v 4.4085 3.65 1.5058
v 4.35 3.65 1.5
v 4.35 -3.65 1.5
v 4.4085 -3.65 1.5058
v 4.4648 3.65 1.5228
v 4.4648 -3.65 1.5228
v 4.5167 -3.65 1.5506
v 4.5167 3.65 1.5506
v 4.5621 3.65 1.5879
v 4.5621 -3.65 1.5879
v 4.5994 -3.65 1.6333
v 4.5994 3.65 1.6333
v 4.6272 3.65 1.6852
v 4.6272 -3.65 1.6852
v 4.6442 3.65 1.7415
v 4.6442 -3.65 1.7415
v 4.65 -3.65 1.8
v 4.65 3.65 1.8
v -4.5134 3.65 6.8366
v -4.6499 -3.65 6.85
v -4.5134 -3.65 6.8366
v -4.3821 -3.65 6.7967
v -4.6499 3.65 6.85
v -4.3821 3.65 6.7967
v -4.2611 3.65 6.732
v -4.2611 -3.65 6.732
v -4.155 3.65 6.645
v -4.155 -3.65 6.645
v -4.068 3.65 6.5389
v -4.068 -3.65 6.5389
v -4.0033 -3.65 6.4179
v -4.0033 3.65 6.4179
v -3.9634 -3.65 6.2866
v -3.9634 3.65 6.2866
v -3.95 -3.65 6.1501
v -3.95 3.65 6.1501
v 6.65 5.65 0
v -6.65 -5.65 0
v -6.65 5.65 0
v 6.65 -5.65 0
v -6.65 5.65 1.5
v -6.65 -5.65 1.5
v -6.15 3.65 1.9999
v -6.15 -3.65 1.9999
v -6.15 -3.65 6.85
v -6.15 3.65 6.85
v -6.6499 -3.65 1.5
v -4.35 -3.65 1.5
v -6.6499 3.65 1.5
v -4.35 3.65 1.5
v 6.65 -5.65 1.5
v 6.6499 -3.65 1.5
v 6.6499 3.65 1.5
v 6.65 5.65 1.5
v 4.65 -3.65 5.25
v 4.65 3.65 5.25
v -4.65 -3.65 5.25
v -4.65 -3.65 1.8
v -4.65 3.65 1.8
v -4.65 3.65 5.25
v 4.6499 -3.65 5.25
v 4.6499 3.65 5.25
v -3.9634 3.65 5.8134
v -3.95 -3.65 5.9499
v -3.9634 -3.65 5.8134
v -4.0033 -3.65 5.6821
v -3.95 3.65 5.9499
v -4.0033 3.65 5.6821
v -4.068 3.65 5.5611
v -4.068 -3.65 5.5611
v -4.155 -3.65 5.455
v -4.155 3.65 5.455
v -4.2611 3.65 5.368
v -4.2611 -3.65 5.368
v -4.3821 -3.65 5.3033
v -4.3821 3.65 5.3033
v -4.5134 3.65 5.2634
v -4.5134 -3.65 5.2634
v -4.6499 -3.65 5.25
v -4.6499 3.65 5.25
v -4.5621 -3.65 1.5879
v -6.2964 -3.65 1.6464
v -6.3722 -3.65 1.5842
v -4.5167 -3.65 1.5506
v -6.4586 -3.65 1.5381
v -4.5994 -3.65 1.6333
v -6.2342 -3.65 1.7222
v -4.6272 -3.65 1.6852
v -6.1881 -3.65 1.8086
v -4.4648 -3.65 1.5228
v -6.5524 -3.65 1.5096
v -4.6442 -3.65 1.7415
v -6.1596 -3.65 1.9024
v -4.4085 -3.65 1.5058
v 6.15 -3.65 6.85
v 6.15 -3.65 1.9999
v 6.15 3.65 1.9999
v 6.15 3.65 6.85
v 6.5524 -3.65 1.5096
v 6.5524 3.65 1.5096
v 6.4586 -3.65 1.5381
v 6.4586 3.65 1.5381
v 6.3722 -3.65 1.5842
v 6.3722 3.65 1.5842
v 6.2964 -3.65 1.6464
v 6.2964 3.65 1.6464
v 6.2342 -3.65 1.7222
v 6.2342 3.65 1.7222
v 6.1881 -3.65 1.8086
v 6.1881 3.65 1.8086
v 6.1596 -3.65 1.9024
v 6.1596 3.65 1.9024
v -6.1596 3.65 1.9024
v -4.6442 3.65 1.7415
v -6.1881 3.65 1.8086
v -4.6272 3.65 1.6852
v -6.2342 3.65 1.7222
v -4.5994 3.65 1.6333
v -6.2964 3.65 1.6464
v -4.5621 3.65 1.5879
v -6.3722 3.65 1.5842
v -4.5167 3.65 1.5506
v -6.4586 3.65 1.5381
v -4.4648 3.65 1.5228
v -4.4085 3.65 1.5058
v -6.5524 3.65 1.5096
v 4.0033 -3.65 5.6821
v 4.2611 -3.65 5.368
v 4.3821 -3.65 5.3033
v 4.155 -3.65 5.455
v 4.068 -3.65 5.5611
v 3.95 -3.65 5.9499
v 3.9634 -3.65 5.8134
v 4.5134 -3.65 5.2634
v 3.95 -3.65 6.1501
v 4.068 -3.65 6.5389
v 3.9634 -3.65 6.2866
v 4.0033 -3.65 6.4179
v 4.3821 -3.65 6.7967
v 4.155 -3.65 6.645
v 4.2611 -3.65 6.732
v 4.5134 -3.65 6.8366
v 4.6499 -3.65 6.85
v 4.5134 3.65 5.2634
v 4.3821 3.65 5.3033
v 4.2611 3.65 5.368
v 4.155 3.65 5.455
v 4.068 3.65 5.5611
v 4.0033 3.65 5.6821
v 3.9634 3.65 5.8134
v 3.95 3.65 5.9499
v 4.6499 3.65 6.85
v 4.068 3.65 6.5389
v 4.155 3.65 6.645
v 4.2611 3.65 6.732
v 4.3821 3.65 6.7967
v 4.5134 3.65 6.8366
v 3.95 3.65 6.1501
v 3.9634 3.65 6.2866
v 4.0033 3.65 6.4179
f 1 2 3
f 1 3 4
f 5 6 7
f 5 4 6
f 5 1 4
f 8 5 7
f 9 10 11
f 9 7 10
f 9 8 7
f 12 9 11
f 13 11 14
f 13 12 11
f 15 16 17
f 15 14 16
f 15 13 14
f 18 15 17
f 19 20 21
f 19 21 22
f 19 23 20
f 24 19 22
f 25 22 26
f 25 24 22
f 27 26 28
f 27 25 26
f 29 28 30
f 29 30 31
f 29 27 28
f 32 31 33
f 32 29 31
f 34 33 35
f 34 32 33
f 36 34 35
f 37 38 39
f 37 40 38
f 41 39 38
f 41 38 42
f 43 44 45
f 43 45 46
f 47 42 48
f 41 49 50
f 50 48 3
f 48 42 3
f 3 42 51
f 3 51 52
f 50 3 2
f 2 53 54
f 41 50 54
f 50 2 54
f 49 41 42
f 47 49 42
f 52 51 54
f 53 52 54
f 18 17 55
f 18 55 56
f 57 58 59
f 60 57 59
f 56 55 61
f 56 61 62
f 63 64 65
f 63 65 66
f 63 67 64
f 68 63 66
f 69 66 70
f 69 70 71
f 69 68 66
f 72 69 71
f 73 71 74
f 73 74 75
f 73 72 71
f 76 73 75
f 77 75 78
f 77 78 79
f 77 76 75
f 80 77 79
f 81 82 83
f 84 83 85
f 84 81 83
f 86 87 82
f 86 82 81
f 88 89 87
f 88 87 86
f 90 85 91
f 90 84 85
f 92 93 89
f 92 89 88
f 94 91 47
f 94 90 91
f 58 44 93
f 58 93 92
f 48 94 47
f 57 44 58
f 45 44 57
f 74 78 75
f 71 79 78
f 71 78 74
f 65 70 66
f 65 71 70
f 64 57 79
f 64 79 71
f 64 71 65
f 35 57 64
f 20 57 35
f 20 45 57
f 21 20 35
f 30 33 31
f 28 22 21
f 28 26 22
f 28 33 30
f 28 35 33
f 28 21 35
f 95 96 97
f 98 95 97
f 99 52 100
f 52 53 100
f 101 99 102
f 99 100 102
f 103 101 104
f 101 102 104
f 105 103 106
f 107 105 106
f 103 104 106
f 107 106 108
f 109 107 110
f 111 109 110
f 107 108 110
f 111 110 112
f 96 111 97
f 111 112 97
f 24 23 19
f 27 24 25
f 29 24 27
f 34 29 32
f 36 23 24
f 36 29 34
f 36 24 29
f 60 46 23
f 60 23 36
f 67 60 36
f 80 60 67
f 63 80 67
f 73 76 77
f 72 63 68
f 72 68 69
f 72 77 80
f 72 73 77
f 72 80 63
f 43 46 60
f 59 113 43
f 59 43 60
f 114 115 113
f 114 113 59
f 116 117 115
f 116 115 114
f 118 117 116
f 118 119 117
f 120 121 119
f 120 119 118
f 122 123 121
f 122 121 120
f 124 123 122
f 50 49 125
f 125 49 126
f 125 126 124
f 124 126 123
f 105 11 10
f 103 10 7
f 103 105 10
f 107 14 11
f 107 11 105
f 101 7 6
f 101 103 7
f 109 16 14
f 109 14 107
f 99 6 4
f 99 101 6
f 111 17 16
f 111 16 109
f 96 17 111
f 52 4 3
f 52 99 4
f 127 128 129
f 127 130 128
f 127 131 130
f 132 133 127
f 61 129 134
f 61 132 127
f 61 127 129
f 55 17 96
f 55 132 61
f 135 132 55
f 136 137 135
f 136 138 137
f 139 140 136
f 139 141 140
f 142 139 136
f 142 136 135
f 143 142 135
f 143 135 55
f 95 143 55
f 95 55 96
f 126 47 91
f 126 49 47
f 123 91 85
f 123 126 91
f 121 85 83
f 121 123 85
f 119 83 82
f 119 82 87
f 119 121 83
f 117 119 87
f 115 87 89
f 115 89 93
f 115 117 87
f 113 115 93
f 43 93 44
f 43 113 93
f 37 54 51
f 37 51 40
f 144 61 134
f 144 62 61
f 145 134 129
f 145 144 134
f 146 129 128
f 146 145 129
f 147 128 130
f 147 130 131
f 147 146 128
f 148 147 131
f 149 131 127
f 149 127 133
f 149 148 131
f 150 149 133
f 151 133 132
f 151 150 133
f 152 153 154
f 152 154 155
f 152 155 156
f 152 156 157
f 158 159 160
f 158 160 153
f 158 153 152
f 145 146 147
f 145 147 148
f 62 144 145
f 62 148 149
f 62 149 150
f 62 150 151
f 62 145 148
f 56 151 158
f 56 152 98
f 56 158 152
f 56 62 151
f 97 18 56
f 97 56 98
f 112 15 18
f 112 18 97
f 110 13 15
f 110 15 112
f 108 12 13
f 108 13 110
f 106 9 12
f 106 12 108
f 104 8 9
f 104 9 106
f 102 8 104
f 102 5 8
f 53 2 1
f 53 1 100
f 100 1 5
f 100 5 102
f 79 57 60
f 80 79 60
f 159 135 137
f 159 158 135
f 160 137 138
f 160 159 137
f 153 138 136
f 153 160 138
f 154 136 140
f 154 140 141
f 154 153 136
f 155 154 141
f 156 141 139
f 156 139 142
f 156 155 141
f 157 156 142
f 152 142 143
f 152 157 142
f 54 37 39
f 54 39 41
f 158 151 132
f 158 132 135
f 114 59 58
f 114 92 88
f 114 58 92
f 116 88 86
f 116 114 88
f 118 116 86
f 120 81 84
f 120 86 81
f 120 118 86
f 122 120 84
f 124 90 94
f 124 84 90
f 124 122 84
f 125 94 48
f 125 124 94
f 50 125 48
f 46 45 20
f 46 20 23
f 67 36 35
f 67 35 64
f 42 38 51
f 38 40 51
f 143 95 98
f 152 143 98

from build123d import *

# Parameters (mm, degrees)
SKETCH_1_W          = 12.3
SKETCH_1_H          = 11.3
EXTRUDE_1_DEPTH     = 2.5
SKETCH_2_W          = 1.5
SKETCH_2_H          = 11.3
EXTRUDE_2_DEPTH     = 4.35
SKETCH_5_W          = 9.3
SKETCH_5_H          = 11.5
CUT_EXTRUDE_1_DEPTH = 1
SKETCH_8_W          = 1.6
SKETCH_8_H          = 11.3
EXTRUDE_5_DEPTH     = 0.7
SKETCH_9_W          = 1.6
SKETCH_9_H          = 11.3
EXTRUDE_6_DEPTH     = 0.7
FILLET_8_R          = 0.3
SKETCH_11_W         = 12.3
SKETCH_11_H         = 5.35
CUT_EXTRUDE_2_DEPTH = 2
SKETCH_12_W         = 12.3
SKETCH_12_H         = 5.35
CUT_EXTRUDE_3_DEPTH = 2
SKETCH_13_W         = 1.5
SKETCH_13_H         = 11.3
EXTRUDE_7_DEPTH     = 0.5
SKETCH_14_W         = 1.5
SKETCH_14_H         = 11.3
EXTRUDE_8_DEPTH     = 0.5
FILLET_9_R          = 0.5
FILLET_10_R         = 0.7


with BuildPart() as part:
    # 스케치1 → 보스-돌출1 (new body)
    with BuildSketch(Plane.XY):
        Rectangle(SKETCH_1_W, SKETCH_1_H)
    extrude(amount=EXTRUDE_1_DEPTH)

    # 스케치2 → 보스-돌출2 (add)
    with BuildSketch(Plane.XY.offset(2.5)):
        with Locations((-5.4, 0)):
            Rectangle(SKETCH_2_W, SKETCH_2_H)
        with Locations((5.4, 0)):
            Rectangle(SKETCH_2_W, SKETCH_2_H)
    extrude(amount=EXTRUDE_2_DEPTH)

    # 스케치5 → 컷-돌출1 (cut)
    with BuildSketch(Plane.XY.offset(2.5)):
        Rectangle(SKETCH_5_W, SKETCH_5_H)
    extrude(amount=-CUT_EXTRUDE_1_DEPTH, mode=Mode.SUBTRACT)

    # 스케치8 → 보스-돌출5 (add)
    with BuildSketch(Plane(origin=(-4.65, 0, 0), x_dir=(0, 0, -1), z_dir=(1, 0, 0))):
        with Locations((-6.05, 0)):
            Rectangle(SKETCH_8_W, SKETCH_8_H)
    extrude(amount=EXTRUDE_5_DEPTH)

    # 스케치9 → 보스-돌출6 (add)
    with BuildSketch(Plane.ZY.offset(-4.65)):
        with Locations((6.05, 0)):
            Rectangle(SKETCH_9_W, SKETCH_9_H)
    extrude(amount=EXTRUDE_6_DEPTH)

    # 필렛8
    fillet_8_edges = [part.edges().sort_by_distance(p)[0] for p in [
        (4.65, 0, 1.5),
        (-4.65, 0, 1.5),
    ]]
    fillet(fillet_8_edges, radius=FILLET_8_R)

    # 스케치11 → 컷-돌출2 (cut)
    with BuildSketch(Plane(origin=(0, 5.65, 0), x_dir=(1, 0, 0), z_dir=(0, 1, 0))):
        with Locations((0, -4.175)):
            Rectangle(SKETCH_11_W, SKETCH_11_H)
    extrude(amount=-CUT_EXTRUDE_2_DEPTH, mode=Mode.SUBTRACT)

    # 스케치12 → 컷-돌출3 (cut)
    with BuildSketch(Plane.XZ.offset(5.65)):
        with Locations((0, 4.175)):
            Rectangle(SKETCH_12_W, SKETCH_12_H)
    extrude(amount=-CUT_EXTRUDE_3_DEPTH, mode=Mode.SUBTRACT)

    # 스케치13 → 보스-돌출7 (add)
    with BuildSketch(Plane(origin=(6.15, 0, 0), x_dir=(0, 0, -1), z_dir=(1, 0, 0))):
        with Locations((-0.75, 0)):
            Rectangle(SKETCH_13_W, SKETCH_13_H)
    extrude(amount=EXTRUDE_7_DEPTH)

    # 스케치14 → 보스-돌출8 (add)
    with BuildSketch(Plane.ZY.offset(6.15)):
        with Locations((0.75, 0)):
            Rectangle(SKETCH_14_W, SKETCH_14_H)
    extrude(amount=EXTRUDE_8_DEPTH)

    # 필렛9
    fillet_9_edges = [part.edges().sort_by_distance(p)[0] for p in [
        (6.15, 0, 1.5),
        (-6.15, 0, 1.5),
    ]]
    fillet(fillet_9_edges, radius=FILLET_9_R - 0.0001)  # a hair under: the kernel refuses the full size

    # 필렛10
    fillet_10_edges = [part.edges().sort_by_distance(p)[0] for p in [
        (-3.95, 0, 6.85),
        (-3.95, 0, 5.25),
        (3.95, 0, 5.25),
        (3.95, 0, 6.85),
    ]]
    fillet(fillet_10_edges, radius=FILLET_10_R - 0.0001)  # a hair under: the kernel refuses the full size


solid = part.part
